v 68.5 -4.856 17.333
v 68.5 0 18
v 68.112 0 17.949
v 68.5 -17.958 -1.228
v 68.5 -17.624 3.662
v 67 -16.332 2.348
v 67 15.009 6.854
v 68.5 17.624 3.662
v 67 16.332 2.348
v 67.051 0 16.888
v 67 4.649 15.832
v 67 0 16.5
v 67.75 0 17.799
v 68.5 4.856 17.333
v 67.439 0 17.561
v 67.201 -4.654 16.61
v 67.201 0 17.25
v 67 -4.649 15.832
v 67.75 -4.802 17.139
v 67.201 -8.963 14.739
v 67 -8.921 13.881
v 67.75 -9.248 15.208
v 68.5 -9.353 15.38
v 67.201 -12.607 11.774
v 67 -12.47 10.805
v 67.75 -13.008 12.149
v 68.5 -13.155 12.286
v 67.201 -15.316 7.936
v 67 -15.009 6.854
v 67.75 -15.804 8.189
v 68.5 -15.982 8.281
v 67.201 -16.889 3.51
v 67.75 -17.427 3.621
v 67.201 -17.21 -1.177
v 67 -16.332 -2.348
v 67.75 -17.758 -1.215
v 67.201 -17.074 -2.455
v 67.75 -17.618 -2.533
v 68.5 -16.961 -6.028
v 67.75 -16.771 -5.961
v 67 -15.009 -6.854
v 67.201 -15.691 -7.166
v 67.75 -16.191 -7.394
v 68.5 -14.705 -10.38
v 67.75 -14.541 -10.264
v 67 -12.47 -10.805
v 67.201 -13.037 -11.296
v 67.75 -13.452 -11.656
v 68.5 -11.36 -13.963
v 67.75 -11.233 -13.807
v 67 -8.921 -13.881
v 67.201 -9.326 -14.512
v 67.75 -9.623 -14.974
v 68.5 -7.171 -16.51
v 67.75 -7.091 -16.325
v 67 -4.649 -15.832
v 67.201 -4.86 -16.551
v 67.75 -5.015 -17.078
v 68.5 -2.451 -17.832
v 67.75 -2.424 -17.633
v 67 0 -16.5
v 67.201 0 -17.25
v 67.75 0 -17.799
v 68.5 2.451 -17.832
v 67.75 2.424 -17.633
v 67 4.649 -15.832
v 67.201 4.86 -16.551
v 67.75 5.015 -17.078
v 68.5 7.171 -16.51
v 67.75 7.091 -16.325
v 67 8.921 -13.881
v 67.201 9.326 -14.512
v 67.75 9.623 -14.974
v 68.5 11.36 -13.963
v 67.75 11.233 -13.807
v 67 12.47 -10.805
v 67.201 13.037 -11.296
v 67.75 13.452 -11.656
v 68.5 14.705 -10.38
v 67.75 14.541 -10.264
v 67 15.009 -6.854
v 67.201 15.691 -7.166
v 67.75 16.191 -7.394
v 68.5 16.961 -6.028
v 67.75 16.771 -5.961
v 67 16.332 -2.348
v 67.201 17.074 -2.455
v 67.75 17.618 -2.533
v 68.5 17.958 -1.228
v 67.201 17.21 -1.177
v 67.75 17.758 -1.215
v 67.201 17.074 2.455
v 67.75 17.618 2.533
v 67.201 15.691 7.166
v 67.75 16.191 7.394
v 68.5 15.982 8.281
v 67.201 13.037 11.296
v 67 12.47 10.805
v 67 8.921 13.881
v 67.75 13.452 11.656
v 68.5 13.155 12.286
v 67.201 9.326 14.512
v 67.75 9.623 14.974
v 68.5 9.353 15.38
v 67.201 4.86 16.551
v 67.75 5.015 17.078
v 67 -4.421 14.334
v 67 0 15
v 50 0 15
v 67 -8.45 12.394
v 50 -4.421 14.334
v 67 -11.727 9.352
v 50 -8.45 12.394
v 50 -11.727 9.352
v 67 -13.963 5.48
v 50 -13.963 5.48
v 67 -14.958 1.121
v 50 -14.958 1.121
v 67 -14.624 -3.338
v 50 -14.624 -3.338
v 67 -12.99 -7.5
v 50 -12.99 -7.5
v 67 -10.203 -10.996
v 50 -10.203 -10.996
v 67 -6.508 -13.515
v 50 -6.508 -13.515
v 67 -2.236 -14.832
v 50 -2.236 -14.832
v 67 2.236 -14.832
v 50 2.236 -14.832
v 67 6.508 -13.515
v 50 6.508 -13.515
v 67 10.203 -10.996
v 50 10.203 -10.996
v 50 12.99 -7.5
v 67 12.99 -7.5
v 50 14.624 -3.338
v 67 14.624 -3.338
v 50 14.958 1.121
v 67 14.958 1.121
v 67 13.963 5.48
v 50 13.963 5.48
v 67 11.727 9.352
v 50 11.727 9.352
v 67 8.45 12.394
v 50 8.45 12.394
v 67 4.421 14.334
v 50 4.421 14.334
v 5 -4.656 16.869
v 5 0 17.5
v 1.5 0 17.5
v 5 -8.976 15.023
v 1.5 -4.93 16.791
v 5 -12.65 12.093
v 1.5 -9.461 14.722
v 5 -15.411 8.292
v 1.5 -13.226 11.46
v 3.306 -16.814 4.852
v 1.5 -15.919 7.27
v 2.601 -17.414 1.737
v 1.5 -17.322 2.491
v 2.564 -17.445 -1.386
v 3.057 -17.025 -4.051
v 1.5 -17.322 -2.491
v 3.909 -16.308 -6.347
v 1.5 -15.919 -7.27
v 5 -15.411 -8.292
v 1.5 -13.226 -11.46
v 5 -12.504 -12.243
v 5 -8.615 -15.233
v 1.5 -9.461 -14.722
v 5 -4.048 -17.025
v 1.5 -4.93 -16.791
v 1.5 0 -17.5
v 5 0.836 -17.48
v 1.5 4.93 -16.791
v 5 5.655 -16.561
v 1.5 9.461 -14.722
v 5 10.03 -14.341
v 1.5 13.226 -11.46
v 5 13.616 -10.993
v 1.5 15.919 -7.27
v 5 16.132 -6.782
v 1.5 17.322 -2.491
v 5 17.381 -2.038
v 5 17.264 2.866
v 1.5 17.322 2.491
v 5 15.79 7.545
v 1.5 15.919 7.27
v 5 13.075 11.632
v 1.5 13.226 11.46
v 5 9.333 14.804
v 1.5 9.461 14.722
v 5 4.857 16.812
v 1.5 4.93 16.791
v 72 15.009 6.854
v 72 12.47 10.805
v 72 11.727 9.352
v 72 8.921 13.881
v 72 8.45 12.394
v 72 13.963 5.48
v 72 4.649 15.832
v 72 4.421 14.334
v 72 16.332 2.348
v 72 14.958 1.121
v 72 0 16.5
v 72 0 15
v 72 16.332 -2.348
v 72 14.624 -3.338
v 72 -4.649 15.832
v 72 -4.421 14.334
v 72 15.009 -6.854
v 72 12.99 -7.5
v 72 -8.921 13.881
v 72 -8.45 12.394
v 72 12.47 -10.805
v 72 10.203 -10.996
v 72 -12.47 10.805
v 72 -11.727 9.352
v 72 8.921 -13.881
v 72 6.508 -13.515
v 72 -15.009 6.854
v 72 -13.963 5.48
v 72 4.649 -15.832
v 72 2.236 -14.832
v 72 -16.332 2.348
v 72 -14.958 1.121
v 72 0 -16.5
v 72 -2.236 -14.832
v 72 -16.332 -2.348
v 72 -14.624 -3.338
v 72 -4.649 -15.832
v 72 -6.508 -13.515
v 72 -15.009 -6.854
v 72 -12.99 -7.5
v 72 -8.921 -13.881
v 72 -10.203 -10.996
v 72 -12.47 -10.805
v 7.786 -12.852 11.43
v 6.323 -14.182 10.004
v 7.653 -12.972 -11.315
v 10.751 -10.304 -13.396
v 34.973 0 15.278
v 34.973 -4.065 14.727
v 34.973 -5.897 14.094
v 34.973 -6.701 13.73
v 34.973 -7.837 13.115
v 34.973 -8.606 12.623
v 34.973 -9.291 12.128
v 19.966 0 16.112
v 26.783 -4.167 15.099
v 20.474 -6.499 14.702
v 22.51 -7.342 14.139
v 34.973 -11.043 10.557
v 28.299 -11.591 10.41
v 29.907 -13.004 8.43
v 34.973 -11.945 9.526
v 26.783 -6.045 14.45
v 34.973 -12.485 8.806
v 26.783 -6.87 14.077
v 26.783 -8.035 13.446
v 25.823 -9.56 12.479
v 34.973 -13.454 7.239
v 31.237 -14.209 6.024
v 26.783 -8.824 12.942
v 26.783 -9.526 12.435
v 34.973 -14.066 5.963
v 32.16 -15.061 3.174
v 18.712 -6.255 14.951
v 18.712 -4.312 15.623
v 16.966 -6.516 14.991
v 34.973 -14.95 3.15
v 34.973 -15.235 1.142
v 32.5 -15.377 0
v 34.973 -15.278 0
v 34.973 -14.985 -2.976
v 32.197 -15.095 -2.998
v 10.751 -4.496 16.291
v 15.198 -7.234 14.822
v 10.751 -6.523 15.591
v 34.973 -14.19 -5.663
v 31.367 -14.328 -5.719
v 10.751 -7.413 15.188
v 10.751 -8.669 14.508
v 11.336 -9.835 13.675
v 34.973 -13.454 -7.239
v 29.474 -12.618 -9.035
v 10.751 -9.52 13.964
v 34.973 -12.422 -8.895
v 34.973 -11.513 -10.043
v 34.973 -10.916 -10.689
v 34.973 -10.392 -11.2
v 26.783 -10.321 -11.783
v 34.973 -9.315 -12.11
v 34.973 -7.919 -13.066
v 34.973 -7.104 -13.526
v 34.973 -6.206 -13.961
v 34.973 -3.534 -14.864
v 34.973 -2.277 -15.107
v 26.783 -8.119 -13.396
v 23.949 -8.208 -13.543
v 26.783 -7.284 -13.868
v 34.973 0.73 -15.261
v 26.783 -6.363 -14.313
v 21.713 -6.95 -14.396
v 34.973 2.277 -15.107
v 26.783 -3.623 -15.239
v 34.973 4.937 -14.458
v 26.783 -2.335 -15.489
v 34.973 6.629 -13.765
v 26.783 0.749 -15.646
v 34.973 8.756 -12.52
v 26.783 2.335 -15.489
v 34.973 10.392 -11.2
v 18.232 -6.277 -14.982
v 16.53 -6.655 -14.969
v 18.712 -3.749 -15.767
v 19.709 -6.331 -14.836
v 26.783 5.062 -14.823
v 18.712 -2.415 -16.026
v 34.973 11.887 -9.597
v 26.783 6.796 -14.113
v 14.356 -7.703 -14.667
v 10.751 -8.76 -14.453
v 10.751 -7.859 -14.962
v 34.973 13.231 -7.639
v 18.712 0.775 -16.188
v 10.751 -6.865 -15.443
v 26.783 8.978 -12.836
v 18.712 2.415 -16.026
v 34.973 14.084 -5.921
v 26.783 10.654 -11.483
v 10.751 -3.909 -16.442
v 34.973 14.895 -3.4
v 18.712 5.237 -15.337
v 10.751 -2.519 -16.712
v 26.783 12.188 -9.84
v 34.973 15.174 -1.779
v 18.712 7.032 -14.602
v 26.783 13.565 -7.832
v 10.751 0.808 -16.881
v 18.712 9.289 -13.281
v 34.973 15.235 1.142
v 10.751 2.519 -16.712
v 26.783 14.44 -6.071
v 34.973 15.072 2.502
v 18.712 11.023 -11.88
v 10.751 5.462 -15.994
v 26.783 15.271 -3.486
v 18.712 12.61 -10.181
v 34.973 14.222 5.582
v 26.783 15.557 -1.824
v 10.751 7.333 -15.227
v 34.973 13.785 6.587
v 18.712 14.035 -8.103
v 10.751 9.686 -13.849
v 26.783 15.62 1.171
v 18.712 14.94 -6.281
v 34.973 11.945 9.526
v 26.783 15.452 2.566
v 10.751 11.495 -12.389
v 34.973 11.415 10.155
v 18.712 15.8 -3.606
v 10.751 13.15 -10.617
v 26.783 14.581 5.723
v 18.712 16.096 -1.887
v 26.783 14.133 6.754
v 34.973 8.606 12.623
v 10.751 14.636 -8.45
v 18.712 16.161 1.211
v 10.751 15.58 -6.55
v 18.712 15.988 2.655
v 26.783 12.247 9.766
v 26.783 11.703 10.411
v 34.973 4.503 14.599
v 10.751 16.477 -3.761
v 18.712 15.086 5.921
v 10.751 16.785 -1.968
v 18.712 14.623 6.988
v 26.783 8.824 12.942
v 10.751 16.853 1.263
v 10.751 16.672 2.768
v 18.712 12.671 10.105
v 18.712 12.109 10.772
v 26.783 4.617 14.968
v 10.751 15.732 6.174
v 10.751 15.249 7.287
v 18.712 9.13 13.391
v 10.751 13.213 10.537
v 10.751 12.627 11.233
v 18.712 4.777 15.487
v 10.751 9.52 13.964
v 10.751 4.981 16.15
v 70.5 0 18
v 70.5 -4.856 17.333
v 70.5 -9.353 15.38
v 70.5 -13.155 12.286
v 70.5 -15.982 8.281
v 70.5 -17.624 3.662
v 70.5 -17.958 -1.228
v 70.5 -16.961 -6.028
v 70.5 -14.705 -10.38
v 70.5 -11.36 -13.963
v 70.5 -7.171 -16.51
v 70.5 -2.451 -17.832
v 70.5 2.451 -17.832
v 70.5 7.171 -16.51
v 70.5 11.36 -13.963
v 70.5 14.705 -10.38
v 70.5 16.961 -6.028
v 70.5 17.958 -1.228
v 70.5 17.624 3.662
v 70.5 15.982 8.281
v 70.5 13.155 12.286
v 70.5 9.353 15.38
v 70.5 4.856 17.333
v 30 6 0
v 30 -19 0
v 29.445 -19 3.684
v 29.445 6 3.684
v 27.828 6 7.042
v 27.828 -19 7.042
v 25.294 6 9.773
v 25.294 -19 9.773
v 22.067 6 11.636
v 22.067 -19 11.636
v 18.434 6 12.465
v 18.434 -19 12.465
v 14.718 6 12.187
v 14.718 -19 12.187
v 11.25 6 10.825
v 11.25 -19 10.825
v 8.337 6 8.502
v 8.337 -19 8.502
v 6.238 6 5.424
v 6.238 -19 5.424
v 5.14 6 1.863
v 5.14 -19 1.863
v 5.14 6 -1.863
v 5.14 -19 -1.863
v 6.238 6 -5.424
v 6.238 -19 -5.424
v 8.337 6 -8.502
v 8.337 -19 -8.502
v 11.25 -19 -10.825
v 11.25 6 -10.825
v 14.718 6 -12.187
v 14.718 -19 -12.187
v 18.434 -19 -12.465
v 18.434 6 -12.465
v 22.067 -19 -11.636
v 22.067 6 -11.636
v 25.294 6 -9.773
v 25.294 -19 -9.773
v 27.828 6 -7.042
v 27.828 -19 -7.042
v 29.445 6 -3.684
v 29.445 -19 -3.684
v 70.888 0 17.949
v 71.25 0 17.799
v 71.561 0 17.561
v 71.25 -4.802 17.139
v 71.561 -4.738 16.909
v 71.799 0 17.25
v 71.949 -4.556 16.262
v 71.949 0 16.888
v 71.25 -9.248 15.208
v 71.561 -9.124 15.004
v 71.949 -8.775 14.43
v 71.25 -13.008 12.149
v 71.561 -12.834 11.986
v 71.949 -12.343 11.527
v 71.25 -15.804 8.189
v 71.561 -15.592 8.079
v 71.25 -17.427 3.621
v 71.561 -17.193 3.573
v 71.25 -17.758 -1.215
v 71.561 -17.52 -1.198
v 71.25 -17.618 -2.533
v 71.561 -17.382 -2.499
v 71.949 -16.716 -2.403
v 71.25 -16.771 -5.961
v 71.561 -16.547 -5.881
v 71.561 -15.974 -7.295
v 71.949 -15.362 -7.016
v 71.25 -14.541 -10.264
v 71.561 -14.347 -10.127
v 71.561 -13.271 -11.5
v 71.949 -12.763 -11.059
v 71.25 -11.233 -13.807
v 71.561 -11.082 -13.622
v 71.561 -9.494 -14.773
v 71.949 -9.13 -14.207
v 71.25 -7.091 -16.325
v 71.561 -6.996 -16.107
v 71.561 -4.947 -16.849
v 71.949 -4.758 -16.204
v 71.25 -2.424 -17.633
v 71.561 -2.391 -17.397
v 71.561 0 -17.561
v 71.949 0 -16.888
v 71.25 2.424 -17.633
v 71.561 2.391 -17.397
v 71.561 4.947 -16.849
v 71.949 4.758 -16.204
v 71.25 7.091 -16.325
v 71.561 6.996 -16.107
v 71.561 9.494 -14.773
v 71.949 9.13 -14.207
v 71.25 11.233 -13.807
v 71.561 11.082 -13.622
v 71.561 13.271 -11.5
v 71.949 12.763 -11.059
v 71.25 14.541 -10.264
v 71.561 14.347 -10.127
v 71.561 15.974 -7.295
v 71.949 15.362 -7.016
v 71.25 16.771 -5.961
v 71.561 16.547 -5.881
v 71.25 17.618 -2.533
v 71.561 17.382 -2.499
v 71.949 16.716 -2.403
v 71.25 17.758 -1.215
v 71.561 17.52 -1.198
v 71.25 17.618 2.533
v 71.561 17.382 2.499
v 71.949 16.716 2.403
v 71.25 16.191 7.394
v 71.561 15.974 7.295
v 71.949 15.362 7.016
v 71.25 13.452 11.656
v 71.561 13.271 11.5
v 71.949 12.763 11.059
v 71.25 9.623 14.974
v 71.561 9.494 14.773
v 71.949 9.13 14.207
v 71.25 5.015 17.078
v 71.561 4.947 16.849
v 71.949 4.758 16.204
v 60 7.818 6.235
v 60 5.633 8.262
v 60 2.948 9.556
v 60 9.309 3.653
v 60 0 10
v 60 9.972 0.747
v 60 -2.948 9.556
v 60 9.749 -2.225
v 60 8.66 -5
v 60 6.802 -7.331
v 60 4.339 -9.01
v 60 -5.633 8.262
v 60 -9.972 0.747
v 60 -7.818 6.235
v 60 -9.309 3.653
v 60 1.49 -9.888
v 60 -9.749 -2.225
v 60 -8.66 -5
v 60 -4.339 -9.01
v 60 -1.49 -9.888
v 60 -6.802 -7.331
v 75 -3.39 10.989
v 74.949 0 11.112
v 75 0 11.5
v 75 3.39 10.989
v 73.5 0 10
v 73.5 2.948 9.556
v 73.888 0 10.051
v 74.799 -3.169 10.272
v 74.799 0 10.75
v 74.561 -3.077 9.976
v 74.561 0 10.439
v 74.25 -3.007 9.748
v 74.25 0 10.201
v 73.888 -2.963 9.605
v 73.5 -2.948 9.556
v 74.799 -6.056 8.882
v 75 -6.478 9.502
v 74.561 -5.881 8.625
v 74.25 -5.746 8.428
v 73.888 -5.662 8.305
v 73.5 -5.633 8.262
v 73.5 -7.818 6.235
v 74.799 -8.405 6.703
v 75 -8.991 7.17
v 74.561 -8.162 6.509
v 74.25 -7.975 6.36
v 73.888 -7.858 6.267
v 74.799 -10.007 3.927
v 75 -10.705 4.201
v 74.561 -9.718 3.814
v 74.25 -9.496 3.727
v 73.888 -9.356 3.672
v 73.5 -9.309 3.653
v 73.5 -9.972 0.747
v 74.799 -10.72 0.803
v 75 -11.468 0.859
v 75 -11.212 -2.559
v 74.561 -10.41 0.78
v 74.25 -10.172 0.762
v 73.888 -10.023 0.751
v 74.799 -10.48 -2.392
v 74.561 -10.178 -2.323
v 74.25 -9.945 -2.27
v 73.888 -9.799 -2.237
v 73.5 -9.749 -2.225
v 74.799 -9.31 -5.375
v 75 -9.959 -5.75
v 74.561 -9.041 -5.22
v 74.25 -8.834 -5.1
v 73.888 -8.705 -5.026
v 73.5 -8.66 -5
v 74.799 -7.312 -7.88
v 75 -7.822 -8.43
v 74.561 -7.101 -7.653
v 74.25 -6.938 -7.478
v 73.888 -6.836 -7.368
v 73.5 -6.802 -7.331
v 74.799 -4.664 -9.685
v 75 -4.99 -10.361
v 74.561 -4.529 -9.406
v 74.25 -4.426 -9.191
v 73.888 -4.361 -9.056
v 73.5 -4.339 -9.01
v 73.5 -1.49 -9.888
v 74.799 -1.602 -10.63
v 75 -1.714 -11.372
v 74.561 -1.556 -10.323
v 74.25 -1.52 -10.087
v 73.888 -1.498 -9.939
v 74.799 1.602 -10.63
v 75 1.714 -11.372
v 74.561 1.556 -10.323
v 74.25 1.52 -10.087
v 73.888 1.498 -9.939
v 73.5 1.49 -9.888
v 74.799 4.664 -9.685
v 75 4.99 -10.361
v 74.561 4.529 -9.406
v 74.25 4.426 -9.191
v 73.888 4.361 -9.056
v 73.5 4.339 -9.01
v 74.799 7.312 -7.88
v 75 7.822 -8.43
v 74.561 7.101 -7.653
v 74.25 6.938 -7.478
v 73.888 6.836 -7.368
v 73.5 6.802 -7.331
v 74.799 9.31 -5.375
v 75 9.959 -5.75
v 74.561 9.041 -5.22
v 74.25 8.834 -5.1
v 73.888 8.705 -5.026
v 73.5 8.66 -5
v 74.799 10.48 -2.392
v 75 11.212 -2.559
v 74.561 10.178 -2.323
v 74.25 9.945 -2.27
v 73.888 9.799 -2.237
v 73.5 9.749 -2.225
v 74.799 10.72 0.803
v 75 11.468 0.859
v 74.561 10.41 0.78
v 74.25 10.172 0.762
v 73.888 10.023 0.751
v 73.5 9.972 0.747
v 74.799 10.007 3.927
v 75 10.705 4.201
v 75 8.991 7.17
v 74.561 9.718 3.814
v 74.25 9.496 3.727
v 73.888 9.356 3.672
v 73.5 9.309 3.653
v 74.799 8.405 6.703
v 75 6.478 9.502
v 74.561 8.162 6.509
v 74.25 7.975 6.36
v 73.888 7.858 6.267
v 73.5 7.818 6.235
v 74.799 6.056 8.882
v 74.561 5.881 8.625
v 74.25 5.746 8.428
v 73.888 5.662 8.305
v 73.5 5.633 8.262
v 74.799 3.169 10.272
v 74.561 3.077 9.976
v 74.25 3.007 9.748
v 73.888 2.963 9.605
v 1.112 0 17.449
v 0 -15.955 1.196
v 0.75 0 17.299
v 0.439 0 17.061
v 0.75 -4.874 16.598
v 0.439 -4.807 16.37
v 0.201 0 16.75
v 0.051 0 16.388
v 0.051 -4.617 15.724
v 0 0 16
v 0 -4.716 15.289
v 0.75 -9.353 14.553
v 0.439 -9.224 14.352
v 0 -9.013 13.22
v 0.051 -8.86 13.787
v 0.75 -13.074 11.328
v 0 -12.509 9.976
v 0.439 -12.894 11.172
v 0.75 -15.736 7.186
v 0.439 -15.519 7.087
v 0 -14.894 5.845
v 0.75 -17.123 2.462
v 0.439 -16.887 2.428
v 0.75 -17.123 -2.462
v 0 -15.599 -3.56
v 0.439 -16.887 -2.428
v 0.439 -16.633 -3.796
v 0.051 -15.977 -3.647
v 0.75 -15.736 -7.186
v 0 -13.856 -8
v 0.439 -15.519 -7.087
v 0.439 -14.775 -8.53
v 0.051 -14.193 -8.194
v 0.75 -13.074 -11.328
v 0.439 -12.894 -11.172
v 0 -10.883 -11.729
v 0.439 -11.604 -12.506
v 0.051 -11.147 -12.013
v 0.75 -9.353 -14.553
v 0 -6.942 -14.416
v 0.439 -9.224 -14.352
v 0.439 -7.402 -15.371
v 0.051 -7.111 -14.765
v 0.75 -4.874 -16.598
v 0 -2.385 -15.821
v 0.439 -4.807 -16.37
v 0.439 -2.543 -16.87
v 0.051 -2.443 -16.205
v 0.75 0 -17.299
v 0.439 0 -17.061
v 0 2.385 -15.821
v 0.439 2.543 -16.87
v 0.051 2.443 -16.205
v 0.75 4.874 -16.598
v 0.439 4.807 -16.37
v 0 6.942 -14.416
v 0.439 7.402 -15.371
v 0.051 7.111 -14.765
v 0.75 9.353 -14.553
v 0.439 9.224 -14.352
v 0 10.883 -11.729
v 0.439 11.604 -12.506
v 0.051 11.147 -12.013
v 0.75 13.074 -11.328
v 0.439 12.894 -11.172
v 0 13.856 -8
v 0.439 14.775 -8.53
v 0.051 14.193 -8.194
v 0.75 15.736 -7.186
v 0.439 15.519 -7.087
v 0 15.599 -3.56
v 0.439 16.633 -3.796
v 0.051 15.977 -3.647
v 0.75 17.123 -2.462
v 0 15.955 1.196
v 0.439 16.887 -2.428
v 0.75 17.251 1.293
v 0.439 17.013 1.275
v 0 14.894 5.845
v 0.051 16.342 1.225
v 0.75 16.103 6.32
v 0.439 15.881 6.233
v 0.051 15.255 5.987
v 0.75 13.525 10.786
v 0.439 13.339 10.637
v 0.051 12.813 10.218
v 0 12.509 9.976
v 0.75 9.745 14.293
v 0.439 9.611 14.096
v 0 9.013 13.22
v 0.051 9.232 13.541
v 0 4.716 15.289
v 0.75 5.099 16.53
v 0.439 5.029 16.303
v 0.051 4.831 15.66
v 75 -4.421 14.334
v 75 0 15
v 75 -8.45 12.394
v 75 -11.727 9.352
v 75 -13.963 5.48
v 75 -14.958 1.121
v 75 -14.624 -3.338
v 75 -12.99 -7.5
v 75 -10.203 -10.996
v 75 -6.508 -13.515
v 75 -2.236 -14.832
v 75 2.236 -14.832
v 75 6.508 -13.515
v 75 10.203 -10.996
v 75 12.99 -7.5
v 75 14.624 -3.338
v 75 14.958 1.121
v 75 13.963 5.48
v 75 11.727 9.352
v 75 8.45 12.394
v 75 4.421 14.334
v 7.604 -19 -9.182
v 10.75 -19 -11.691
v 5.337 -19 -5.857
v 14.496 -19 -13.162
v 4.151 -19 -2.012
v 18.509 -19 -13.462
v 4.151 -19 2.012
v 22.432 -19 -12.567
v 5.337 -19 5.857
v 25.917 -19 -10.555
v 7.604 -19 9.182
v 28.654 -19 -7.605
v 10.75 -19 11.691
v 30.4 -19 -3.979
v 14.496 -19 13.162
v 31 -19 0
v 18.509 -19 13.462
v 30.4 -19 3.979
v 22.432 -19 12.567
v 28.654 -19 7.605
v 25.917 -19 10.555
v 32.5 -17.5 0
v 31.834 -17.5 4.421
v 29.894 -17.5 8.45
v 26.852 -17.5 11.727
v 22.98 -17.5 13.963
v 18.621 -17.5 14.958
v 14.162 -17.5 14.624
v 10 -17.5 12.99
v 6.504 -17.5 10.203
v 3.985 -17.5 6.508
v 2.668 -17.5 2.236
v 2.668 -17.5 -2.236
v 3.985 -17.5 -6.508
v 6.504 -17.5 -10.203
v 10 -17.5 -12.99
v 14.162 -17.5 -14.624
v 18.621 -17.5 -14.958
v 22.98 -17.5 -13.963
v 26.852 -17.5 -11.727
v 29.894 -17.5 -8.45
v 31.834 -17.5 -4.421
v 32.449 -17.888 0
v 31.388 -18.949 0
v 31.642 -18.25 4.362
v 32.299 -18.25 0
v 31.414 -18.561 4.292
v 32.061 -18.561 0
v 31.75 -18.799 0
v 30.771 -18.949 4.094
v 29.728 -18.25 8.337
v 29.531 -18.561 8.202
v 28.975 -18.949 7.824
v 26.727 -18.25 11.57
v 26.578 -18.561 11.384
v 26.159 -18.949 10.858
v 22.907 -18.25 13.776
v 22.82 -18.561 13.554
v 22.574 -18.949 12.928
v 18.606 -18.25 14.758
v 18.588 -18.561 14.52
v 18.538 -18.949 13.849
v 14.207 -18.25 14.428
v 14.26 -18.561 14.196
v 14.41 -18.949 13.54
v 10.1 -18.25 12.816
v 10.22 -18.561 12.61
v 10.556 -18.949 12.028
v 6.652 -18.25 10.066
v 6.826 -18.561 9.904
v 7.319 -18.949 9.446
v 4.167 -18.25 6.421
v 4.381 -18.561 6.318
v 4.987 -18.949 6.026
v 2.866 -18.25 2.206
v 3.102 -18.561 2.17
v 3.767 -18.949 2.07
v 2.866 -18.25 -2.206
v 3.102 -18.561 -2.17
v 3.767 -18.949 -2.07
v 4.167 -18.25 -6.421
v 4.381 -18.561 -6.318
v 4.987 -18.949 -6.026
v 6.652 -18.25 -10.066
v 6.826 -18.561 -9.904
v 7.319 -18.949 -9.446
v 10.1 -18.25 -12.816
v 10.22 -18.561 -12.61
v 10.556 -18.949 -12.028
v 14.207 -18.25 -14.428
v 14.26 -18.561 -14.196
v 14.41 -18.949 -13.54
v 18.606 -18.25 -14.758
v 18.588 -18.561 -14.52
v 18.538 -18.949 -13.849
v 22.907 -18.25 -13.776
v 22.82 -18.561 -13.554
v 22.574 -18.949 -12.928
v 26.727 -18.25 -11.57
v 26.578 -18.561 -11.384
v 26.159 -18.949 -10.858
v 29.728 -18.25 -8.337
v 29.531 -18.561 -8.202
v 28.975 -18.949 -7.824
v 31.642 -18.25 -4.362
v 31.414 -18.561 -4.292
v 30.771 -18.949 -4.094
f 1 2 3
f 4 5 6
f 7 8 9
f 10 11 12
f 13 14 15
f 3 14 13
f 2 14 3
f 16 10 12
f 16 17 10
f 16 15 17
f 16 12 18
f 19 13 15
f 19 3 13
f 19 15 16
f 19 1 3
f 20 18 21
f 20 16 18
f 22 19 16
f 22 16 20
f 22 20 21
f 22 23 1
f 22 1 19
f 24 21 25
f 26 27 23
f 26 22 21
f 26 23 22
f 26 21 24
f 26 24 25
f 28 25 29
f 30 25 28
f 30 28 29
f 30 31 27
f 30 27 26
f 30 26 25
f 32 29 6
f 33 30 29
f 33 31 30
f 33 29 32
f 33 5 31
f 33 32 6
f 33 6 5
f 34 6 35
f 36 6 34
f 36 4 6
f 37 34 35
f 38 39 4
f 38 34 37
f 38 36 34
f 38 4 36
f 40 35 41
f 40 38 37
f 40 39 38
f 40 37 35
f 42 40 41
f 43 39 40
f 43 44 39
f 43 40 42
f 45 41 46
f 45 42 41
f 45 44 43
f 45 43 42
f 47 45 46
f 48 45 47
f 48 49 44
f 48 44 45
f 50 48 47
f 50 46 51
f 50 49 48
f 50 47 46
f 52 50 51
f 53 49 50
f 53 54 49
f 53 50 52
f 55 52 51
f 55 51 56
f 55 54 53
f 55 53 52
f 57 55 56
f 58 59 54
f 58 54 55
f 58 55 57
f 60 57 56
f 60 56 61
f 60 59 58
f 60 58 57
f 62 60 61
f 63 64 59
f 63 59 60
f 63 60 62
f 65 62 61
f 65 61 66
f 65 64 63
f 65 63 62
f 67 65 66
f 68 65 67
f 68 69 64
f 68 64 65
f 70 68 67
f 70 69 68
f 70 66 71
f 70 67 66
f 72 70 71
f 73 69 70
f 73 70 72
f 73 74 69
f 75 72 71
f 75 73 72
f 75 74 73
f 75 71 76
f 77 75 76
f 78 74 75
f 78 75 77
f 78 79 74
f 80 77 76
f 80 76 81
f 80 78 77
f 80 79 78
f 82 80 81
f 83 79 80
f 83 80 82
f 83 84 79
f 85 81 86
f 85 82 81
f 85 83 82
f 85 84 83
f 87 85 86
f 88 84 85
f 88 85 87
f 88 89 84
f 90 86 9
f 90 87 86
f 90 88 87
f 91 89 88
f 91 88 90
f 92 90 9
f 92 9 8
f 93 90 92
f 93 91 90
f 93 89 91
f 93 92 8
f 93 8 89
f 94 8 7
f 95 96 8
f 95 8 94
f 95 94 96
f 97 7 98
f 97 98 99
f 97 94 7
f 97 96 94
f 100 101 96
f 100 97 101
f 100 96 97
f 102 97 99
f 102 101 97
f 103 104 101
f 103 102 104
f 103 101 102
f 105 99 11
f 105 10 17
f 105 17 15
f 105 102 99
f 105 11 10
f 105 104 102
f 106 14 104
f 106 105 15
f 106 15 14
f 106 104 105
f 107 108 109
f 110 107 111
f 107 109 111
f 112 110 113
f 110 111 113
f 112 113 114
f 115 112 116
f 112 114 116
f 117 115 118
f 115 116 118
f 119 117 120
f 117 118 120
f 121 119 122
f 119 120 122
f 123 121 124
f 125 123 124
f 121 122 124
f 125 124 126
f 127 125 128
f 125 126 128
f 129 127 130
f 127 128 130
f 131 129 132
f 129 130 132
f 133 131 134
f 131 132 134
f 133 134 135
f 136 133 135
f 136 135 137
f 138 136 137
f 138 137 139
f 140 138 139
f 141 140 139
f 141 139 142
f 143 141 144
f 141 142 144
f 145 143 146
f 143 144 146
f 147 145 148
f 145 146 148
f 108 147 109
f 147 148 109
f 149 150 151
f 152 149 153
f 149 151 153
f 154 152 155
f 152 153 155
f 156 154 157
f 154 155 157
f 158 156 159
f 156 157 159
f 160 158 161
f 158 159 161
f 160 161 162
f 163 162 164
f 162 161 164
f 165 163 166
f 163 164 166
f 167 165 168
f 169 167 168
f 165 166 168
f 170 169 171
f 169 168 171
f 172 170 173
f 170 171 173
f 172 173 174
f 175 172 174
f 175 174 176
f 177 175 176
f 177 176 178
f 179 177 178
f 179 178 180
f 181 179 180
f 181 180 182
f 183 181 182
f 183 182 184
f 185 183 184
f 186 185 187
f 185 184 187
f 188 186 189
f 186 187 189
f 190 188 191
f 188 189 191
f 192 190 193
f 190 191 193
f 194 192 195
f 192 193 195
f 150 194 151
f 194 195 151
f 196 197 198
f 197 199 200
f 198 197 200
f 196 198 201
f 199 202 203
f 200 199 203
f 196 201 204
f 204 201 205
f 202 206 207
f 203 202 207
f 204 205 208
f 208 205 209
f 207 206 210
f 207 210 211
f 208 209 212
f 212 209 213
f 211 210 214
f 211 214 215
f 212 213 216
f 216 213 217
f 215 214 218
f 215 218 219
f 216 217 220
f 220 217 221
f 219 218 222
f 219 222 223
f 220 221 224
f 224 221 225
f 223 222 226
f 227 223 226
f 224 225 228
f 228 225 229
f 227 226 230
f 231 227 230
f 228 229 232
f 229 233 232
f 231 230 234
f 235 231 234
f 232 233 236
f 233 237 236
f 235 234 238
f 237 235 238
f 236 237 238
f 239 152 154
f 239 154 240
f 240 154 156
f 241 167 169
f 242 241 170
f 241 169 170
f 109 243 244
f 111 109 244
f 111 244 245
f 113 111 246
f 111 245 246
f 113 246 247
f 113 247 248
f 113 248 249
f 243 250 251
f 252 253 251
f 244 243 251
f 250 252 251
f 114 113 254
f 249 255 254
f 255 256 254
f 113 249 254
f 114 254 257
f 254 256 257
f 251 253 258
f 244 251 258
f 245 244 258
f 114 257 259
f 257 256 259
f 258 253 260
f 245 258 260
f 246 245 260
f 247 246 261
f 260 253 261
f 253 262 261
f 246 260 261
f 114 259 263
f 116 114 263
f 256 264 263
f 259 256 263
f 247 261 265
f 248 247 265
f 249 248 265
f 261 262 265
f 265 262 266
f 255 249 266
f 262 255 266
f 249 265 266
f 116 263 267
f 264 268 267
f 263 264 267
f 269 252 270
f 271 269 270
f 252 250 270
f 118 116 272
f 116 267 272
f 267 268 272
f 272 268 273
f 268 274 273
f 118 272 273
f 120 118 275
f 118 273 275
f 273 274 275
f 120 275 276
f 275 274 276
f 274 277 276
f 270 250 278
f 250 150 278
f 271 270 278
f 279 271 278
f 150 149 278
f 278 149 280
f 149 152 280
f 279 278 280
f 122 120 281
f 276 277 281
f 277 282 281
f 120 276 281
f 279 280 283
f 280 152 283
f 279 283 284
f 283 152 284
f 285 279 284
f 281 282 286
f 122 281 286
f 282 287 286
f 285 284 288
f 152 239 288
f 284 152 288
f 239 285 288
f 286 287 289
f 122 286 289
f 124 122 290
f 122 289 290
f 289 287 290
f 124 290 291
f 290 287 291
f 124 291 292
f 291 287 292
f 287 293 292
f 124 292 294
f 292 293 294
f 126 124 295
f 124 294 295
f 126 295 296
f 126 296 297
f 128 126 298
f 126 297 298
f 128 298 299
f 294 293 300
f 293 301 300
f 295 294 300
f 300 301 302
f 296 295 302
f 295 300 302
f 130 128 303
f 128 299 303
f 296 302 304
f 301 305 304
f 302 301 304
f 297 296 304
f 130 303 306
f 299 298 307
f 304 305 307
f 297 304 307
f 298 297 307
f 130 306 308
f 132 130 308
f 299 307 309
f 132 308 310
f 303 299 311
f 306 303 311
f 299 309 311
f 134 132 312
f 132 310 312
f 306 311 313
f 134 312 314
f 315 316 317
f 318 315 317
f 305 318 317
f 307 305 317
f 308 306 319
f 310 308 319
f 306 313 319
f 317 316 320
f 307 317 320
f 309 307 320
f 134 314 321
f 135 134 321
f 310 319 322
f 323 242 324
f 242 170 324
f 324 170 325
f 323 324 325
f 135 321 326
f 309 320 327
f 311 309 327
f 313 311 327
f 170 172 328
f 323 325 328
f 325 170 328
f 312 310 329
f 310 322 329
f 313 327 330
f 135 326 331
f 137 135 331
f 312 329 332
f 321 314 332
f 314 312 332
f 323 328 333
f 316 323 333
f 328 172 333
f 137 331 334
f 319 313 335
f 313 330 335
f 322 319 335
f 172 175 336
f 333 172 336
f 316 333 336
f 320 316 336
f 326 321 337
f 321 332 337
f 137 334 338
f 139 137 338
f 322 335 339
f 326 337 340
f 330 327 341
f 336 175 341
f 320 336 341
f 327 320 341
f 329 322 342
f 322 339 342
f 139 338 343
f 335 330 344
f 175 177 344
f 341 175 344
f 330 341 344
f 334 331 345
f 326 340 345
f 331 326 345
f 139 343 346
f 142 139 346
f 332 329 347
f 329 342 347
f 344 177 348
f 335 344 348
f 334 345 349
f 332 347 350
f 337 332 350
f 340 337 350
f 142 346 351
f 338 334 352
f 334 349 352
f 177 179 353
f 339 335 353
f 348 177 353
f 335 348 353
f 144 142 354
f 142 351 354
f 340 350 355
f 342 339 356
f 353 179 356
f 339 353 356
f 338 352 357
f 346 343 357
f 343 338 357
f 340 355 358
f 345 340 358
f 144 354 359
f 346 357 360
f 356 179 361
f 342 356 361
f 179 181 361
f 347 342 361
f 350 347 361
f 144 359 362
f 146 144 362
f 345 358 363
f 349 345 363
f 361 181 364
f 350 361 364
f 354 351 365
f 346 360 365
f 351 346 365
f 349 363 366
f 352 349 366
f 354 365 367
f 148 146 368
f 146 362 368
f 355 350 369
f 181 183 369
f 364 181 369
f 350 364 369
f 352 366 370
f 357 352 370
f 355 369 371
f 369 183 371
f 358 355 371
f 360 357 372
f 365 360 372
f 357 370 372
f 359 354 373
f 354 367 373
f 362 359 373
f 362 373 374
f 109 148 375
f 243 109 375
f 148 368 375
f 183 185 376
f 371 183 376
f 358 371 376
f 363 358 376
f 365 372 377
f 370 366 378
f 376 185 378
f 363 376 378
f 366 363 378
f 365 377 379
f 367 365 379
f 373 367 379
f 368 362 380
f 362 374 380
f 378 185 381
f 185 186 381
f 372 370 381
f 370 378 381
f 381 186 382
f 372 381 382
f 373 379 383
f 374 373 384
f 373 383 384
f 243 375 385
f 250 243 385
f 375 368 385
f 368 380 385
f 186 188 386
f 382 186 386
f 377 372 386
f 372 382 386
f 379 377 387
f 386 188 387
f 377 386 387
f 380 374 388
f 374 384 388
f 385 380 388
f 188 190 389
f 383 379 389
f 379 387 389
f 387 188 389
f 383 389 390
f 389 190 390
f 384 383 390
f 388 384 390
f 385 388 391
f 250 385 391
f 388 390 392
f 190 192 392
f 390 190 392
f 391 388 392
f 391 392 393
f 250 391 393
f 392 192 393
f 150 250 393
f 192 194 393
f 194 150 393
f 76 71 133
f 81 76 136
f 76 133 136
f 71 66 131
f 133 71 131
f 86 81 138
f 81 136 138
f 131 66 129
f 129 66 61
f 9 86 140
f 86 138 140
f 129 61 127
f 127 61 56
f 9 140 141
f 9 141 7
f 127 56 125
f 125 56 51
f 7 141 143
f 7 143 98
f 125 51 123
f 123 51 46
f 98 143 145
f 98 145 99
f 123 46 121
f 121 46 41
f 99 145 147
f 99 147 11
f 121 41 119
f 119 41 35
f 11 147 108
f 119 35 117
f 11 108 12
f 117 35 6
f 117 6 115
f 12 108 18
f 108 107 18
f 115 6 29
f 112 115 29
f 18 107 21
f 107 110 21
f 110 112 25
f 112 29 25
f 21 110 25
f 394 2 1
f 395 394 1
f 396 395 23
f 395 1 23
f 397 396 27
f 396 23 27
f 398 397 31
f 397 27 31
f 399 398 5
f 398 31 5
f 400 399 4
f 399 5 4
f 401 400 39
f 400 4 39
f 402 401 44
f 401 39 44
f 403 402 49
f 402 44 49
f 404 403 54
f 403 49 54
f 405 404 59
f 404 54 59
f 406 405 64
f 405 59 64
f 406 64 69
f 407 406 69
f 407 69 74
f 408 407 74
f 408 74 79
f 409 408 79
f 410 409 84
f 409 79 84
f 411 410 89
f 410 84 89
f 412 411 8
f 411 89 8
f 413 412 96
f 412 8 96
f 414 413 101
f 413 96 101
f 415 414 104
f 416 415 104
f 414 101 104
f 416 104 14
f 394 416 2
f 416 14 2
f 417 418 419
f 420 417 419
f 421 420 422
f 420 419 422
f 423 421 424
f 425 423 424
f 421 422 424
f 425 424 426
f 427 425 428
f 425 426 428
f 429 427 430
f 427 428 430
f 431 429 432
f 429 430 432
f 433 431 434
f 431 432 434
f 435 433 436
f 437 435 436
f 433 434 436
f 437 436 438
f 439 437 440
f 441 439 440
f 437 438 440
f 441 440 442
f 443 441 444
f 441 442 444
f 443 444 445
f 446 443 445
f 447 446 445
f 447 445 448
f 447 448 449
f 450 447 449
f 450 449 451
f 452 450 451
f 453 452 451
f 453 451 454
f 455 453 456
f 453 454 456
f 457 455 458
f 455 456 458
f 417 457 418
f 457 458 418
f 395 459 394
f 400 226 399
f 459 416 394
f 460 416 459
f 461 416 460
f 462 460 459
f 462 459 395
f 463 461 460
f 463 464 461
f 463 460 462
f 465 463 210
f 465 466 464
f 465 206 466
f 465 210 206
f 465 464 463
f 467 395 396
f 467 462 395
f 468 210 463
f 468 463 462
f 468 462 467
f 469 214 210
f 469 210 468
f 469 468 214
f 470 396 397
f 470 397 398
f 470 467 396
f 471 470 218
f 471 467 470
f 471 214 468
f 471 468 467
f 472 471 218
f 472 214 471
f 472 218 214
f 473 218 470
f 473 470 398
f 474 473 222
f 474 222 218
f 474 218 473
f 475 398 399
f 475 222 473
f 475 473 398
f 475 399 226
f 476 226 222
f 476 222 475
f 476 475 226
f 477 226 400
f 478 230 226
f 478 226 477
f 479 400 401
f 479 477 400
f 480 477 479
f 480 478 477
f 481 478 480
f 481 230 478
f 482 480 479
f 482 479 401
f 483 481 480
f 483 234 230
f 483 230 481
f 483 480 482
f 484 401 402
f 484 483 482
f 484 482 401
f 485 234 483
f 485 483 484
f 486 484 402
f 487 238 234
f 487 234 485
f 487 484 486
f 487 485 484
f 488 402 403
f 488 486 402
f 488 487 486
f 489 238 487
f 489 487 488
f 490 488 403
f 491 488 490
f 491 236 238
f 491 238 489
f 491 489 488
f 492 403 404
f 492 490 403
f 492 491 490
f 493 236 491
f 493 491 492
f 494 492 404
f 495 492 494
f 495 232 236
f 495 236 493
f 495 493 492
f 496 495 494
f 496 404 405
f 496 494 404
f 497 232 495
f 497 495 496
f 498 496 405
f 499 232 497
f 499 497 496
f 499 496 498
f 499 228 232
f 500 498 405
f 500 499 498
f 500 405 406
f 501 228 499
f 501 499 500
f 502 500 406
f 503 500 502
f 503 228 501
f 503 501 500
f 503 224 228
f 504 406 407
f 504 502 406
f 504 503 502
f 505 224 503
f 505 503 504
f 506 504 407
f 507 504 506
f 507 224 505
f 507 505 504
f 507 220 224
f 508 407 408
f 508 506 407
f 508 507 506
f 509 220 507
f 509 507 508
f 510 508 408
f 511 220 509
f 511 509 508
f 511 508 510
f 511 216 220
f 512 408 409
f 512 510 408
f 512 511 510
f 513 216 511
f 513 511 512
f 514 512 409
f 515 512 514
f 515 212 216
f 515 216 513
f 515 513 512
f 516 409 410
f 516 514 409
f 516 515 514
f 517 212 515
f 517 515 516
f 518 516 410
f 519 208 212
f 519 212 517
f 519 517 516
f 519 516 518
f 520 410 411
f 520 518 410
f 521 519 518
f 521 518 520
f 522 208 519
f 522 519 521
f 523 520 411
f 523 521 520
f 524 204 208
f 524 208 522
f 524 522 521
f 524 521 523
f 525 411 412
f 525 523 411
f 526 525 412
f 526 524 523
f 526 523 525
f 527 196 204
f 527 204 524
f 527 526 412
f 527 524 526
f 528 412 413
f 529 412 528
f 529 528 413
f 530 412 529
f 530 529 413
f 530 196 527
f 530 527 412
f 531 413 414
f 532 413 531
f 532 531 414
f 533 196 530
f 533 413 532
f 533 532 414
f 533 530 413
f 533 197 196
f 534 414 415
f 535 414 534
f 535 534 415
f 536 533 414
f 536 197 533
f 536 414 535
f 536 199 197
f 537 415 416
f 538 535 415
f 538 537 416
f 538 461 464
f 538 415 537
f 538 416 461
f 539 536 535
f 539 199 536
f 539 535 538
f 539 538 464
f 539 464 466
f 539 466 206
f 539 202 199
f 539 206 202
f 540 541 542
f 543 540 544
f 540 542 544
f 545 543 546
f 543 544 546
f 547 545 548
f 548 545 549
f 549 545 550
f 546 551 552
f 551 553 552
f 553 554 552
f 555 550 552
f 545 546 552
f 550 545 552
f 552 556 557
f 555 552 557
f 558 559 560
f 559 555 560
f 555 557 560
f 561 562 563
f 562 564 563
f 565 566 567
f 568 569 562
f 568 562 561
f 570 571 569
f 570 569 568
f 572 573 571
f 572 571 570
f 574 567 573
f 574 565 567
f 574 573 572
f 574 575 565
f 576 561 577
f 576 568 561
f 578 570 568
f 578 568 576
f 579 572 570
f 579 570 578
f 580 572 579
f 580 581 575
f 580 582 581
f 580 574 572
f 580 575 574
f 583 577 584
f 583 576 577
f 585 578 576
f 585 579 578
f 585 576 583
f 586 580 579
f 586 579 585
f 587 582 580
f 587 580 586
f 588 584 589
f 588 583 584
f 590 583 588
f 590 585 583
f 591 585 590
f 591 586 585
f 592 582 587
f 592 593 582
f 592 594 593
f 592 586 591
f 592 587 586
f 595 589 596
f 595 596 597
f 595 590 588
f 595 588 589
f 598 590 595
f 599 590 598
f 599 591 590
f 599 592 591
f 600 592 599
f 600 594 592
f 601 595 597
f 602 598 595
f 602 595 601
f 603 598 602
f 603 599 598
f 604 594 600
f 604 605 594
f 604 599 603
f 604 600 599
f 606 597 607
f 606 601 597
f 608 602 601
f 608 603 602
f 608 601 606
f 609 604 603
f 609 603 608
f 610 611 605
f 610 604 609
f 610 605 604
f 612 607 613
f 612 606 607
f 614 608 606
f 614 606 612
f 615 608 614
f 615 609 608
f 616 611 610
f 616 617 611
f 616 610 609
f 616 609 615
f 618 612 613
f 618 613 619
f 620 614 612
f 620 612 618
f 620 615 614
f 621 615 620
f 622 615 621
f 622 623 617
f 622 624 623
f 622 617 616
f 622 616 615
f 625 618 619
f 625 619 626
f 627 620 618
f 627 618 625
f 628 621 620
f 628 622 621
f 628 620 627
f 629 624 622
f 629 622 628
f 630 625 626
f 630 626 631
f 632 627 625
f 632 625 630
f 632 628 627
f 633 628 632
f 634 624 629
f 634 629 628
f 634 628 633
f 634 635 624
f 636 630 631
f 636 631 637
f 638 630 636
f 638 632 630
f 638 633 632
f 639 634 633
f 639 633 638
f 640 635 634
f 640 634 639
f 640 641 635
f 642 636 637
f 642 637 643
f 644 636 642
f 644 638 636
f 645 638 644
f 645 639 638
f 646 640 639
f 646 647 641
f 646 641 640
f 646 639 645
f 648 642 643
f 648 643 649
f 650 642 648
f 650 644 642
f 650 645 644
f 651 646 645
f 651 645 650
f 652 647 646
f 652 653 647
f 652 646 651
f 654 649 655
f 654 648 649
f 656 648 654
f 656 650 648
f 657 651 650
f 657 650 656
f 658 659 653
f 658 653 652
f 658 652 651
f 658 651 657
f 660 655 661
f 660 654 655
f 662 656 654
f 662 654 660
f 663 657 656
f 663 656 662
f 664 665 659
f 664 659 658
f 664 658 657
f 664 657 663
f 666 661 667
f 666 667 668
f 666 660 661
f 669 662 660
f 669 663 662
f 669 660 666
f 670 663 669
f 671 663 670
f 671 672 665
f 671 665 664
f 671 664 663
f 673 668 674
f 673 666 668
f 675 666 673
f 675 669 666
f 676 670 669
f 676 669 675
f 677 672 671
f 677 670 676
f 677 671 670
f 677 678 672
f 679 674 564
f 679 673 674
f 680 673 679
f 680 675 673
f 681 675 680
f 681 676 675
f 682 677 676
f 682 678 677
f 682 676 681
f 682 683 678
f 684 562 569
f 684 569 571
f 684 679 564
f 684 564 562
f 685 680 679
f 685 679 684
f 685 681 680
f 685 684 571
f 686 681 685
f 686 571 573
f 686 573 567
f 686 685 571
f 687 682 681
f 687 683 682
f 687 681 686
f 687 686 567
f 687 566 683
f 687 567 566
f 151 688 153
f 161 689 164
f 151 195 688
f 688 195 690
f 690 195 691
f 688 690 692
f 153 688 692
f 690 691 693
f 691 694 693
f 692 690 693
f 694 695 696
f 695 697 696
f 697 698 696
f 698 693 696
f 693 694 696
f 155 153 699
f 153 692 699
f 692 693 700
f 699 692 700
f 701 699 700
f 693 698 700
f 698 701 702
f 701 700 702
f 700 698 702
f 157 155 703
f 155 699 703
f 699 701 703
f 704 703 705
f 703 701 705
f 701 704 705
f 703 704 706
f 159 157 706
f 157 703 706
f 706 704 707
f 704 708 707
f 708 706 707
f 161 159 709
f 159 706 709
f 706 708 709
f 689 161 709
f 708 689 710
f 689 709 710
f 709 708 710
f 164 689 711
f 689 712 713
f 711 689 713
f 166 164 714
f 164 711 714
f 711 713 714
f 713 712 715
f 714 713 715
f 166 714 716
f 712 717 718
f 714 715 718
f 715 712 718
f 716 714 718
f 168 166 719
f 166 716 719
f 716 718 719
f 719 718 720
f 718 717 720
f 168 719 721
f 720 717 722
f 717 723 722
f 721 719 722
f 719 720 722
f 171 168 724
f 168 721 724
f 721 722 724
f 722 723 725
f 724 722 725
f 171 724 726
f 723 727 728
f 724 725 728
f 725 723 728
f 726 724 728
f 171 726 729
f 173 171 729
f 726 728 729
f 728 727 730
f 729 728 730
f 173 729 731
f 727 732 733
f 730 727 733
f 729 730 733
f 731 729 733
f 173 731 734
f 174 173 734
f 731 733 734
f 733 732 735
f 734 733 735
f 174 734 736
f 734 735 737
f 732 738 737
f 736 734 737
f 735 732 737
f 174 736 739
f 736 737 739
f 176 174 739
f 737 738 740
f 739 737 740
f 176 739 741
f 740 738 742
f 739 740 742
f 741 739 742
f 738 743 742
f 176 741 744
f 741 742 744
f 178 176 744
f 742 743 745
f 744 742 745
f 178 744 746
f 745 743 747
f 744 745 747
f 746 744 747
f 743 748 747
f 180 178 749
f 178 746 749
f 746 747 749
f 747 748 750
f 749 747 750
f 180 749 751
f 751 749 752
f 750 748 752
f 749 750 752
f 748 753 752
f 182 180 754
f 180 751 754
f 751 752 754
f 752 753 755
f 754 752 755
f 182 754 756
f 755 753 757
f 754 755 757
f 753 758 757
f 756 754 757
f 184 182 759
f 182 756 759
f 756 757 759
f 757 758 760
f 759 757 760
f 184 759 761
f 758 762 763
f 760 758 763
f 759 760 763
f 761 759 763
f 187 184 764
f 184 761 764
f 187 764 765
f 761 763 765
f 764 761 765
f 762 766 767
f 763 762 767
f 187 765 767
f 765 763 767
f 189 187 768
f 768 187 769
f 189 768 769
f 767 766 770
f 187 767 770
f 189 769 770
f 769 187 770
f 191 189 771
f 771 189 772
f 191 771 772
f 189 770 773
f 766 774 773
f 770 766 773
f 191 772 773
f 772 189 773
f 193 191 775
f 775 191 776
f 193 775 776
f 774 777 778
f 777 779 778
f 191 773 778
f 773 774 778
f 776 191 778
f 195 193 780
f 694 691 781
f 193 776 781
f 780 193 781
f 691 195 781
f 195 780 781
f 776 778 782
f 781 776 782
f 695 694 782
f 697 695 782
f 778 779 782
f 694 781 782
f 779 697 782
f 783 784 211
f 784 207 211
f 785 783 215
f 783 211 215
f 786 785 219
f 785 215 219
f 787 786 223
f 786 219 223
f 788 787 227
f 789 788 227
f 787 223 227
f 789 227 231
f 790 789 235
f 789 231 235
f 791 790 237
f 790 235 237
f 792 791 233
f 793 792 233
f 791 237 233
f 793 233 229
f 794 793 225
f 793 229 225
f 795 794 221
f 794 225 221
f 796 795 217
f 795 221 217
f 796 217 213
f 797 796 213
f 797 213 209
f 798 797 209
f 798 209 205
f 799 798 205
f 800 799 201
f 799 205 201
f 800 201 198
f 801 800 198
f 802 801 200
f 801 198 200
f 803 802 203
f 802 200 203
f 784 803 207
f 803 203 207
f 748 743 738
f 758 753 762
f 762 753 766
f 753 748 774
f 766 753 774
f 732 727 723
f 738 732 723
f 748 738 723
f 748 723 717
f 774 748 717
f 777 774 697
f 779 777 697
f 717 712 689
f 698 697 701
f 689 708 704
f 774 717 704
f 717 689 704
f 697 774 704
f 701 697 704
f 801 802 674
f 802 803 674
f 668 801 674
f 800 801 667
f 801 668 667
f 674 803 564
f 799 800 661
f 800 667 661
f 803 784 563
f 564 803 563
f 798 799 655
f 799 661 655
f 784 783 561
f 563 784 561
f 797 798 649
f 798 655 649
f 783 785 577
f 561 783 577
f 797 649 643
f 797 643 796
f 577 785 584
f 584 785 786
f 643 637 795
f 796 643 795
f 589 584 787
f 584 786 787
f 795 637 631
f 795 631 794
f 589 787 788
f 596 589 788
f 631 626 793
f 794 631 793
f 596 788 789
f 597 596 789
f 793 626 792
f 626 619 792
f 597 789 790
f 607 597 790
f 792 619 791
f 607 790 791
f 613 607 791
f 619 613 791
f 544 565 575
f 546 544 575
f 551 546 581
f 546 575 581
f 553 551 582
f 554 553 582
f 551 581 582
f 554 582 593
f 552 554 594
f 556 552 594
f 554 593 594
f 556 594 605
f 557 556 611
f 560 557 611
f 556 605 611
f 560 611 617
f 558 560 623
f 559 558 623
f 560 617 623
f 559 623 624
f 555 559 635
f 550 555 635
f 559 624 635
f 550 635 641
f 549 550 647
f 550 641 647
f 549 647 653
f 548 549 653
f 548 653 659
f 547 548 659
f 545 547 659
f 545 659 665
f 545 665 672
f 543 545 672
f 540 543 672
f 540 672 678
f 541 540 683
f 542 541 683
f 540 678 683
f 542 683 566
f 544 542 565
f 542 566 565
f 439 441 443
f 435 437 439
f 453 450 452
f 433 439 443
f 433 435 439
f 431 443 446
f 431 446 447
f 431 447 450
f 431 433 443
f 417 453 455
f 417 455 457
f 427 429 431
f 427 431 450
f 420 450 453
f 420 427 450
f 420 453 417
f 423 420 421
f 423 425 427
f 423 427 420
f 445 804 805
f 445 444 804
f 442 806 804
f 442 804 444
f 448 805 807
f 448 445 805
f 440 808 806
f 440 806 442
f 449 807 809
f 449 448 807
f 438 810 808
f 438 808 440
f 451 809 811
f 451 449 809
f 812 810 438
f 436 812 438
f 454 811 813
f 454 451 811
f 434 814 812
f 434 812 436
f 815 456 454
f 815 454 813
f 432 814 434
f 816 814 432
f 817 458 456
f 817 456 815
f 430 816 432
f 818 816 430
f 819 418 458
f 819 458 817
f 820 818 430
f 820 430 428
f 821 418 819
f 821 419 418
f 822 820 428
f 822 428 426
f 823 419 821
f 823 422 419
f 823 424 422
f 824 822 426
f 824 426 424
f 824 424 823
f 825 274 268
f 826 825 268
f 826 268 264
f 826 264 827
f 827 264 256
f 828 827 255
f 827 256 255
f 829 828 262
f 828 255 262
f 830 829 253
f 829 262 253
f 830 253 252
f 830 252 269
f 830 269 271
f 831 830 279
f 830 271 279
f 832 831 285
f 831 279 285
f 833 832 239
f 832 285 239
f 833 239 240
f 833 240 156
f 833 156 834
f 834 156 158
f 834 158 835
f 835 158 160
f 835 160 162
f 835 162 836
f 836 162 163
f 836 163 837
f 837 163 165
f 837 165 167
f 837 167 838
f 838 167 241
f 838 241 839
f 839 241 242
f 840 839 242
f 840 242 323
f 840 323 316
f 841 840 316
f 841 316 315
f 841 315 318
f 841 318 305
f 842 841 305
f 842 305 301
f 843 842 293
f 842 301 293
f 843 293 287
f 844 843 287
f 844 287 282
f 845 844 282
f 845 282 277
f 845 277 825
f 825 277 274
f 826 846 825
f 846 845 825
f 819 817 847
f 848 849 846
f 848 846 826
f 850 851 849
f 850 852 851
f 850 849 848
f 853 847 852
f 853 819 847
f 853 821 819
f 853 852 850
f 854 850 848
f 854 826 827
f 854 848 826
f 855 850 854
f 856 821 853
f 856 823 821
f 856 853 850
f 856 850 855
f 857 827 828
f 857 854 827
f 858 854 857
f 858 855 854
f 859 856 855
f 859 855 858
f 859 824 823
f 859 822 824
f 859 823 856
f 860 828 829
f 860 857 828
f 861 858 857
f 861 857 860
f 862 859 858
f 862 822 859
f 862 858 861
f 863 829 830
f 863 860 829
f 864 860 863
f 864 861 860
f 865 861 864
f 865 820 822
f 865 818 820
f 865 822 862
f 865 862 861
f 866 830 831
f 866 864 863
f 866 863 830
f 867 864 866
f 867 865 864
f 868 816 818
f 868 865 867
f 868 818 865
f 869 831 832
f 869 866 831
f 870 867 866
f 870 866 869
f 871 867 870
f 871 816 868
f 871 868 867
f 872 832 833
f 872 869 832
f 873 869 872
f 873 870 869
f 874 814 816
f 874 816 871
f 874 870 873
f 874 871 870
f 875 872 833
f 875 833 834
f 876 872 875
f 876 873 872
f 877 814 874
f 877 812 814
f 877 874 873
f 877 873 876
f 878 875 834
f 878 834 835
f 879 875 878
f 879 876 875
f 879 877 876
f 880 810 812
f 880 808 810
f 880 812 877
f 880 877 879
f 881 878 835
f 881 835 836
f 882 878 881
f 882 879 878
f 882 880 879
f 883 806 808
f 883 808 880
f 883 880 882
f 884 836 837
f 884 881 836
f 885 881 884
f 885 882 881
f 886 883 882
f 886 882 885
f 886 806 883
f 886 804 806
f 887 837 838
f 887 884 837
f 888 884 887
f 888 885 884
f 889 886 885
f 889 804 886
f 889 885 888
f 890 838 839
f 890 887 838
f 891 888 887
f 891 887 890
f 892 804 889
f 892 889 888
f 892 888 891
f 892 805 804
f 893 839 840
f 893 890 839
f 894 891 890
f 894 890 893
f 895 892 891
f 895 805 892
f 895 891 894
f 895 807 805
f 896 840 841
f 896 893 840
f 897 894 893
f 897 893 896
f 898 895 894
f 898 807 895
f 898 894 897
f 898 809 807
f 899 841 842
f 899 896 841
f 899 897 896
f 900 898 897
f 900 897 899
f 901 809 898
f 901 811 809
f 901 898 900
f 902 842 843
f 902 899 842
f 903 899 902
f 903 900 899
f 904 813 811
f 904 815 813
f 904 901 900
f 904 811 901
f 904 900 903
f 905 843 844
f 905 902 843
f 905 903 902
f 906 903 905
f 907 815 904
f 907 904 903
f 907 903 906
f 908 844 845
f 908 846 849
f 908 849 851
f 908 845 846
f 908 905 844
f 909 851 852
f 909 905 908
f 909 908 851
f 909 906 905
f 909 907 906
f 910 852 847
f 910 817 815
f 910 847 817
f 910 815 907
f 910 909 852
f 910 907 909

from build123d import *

# Parameters (mm, degrees)
F2_R     = 15
F3_DEPTH = 19
F4_R     = 12.5
F5_DEPTH = 25
F6_R     = 1.5


with BuildPart() as f1:
    # F0 (on Front) → F1 (revolve)
    with BuildSketch(Plane.XZ):
        with BuildLine():
            Line((0, 17.5), (0, 0))
            Line((0, 0), (60, 0))
            Line((60, 0), (60, 10))
            Line((60, 10), (75, 10))
            Line((75, 10), (75, 15))
            Line((75, 15), (72, 15))
            Line((72, 15), (72, 18))
            Line((72, 18), (67, 18))
            Line((67, 18), (67, 15))
            Line((67, 15), (50, 15))
            ThreePointArc((50, 15), (27.465305, 15.625482), (5, 17.5))
            Line((5, 17.5), (0, 17.5))
        make_face()
    revolve(axis=Axis((30, 0, 0), (1, 0, 0)))

    # F2 (on Front) → F3 (join)
    with BuildSketch(Plane.XZ):
        with Locations((17.5, 0)):
            Circle(F2_R)
    extrude(amount=F3_DEPTH)

    # F4 (on face) → F5 (cut)
    with BuildSketch(Plane.XZ.offset(19)):
        with Locations((17.5, 0)):
            Circle(F4_R)
    extrude(amount=-F5_DEPTH, mode=Mode.SUBTRACT)

    # F6
    f6_edges = [f1.edges().sort_by_distance(p)[0] for p in [
        (0, 0, -17.5),
        (2.5, -19, 0),
        (67, 0, -18),
        (72, 0, -18),
        (75, 0, -10),
    ]]
    fillet(f6_edges, radius=F6_R)


solid = f1.part
